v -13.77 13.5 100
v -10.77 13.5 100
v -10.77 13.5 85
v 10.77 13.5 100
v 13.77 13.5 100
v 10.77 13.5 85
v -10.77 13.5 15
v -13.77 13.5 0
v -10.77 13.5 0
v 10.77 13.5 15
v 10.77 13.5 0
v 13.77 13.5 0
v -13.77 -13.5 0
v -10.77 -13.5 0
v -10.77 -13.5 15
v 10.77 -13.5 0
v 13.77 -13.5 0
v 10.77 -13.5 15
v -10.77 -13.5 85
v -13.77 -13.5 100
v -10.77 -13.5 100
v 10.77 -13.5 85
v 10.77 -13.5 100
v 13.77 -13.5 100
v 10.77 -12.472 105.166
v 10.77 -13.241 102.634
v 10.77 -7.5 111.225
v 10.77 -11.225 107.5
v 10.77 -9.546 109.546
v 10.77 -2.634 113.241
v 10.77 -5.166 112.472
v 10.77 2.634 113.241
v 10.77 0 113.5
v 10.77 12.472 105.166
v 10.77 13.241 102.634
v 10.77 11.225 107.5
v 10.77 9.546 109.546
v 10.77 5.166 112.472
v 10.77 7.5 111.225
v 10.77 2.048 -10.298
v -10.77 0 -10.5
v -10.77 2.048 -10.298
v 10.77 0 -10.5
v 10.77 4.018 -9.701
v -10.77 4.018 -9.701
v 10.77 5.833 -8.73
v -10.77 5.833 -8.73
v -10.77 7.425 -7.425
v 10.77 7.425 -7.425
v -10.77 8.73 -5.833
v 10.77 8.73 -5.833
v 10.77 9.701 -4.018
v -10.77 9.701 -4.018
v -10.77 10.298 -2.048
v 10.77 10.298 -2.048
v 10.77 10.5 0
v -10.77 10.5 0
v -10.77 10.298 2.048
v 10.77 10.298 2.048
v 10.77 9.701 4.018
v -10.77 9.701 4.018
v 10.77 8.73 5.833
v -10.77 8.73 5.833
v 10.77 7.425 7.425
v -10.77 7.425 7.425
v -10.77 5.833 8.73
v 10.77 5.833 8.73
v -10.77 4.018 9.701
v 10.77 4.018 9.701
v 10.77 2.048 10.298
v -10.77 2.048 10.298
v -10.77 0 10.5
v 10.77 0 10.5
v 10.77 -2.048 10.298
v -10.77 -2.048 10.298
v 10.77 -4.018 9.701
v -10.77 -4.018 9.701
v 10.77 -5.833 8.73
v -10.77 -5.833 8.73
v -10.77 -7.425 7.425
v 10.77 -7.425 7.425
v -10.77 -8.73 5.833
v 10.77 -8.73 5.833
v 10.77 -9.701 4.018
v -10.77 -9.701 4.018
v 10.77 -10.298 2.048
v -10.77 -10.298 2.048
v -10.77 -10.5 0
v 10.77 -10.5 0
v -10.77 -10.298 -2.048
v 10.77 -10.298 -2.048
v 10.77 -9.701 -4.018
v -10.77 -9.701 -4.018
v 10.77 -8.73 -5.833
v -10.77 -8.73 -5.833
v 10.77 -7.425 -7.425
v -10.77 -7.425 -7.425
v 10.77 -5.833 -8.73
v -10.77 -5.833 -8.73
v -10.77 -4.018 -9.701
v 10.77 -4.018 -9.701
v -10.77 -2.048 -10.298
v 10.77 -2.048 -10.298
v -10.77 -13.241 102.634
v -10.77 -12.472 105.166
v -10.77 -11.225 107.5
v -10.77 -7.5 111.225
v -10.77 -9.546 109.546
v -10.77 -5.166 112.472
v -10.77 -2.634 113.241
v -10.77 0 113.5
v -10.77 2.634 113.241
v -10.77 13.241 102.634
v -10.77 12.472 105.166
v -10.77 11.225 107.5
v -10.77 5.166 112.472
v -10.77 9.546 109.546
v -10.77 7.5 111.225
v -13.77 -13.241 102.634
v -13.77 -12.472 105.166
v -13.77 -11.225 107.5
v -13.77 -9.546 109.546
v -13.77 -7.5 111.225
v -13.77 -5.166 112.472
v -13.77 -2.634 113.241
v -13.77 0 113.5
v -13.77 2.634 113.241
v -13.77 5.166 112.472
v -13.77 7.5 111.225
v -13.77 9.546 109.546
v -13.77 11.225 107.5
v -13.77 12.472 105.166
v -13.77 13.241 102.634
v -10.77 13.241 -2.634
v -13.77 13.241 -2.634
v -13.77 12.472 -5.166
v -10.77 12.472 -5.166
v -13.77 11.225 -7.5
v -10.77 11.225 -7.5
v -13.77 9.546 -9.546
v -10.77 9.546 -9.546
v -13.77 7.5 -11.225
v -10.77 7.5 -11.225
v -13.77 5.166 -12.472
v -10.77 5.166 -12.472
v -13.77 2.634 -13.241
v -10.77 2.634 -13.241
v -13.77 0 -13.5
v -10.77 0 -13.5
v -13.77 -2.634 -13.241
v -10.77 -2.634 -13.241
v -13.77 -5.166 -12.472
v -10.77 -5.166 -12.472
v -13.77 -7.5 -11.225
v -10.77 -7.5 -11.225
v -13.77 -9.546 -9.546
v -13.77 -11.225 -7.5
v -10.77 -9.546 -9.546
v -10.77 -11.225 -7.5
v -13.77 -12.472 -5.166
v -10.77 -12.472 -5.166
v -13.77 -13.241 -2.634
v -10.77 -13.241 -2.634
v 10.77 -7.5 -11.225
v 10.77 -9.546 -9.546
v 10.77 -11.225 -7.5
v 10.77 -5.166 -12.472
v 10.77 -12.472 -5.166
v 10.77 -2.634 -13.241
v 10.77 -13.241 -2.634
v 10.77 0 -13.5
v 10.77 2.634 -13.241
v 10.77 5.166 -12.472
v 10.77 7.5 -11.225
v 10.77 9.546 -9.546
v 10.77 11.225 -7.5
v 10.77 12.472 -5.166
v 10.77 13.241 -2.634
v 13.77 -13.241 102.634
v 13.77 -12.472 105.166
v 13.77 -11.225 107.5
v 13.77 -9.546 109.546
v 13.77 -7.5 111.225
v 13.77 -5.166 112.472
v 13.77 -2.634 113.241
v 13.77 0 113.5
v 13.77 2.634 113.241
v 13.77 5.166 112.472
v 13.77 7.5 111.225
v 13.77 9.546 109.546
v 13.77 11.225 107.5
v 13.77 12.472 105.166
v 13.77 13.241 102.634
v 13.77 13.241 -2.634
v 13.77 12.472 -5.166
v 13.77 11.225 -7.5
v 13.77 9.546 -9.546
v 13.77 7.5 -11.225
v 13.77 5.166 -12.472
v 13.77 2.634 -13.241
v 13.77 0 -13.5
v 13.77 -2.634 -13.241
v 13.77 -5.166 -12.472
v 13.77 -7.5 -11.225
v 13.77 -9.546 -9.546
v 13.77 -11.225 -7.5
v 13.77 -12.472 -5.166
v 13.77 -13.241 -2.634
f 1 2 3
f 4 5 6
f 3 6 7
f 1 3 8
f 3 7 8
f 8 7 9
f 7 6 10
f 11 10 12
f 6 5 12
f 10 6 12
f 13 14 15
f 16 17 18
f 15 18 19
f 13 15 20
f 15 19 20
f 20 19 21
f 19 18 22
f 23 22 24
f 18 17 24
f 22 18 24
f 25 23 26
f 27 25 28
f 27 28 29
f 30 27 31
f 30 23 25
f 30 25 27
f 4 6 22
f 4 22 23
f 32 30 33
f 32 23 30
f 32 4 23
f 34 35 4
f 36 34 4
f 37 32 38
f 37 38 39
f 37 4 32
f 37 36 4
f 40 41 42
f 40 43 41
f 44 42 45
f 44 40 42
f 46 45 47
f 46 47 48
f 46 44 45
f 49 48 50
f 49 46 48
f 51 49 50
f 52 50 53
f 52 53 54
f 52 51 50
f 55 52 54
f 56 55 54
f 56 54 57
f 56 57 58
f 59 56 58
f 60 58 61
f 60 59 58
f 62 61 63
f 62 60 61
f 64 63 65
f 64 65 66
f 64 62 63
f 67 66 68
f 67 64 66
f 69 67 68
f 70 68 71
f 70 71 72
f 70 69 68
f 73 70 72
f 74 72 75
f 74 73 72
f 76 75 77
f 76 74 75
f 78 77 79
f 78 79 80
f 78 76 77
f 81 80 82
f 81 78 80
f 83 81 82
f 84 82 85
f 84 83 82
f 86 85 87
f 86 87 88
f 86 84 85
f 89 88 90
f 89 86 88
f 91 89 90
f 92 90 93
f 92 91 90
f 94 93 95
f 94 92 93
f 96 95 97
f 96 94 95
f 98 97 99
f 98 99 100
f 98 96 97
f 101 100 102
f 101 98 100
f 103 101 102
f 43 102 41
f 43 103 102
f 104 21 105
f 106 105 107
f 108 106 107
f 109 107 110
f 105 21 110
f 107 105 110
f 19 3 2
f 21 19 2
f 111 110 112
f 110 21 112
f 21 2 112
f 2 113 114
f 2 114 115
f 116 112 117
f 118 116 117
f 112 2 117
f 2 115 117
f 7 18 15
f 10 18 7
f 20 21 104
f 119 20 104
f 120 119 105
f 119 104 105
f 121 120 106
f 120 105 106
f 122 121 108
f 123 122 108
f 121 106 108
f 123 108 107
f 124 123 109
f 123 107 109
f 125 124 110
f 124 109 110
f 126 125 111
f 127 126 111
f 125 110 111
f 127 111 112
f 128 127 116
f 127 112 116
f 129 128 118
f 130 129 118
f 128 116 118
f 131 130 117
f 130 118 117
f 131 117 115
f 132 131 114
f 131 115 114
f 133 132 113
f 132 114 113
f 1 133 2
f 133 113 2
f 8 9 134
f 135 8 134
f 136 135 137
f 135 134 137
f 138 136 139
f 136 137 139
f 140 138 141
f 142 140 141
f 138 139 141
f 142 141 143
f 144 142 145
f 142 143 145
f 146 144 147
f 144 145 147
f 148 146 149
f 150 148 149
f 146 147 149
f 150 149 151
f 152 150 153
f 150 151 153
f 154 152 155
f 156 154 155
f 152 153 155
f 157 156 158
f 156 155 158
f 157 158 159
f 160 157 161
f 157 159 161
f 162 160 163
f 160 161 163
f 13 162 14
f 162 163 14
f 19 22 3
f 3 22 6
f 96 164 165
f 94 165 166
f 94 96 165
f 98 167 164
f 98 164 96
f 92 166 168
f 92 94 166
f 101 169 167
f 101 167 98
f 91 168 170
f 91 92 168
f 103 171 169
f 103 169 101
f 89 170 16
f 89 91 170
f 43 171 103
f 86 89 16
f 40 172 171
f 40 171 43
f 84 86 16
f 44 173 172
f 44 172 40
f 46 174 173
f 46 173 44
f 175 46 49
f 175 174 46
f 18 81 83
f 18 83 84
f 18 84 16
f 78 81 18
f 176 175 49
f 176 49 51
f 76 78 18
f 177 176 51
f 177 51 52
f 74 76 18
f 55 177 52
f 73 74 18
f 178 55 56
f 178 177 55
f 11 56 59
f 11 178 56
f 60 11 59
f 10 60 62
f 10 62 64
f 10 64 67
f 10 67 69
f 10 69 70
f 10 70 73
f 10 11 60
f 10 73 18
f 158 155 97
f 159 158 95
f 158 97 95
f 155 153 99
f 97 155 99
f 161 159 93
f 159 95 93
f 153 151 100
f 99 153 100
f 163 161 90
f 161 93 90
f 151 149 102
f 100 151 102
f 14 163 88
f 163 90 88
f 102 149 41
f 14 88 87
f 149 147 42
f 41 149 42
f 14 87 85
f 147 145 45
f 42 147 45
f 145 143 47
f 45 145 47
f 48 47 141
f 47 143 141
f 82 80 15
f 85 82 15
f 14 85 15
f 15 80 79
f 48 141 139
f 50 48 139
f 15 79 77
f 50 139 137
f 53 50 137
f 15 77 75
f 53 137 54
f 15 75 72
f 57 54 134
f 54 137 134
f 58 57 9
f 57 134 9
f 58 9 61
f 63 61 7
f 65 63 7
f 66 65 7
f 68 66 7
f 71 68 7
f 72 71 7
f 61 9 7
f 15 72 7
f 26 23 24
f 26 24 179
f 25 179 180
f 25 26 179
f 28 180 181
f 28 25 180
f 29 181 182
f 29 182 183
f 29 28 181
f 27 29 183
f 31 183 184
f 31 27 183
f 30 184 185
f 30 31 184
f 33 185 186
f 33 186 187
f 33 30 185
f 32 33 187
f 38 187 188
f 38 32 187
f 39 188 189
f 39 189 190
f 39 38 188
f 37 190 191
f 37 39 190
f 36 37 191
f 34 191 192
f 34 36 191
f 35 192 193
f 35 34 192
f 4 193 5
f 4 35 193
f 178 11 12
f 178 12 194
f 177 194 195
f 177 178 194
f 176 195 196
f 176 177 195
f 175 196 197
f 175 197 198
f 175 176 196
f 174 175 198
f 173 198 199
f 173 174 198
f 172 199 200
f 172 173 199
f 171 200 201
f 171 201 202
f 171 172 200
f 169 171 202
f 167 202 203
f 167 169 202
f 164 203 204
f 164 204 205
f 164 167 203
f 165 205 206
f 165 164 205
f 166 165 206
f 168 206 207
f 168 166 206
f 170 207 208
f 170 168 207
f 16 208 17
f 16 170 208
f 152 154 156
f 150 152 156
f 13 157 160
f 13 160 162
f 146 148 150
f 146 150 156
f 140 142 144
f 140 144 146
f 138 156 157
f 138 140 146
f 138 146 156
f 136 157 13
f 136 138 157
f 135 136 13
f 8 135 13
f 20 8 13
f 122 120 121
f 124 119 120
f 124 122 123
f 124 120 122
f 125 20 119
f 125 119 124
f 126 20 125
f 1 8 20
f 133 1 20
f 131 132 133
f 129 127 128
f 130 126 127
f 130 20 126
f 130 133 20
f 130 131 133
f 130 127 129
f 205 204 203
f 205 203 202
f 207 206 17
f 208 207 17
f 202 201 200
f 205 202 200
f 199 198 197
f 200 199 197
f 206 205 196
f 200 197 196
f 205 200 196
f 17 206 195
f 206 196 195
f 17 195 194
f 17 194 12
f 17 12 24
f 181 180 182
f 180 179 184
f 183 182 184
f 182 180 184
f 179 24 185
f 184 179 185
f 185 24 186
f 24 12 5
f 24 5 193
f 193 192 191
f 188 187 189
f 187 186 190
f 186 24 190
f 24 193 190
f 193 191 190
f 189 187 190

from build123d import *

# Parameters (mm, degrees)
SCHIZZO1_R                   = 10.5
ESTRUSIONE_ESTRUSIONE1_DEPTH = 10.77
ESTRUSIONE_ESTRUSIONE2_START = 10.77
ESTRUSIONE_ESTRUSIONE2_DEPTH = 3
ESTRUSIONE_ESTRUSIONE3_START = -3
SCHIZZO4_W                   = 70
SCHIZZO4_H                   = 27
ESTRUSIONE_ESTRUSIONE3_DEPTH = 21.54


with BuildPart() as part:
    # Schizzo1 → Estrusione-Estrusione1 (new, symmetric)
    with BuildSketch(Plane(origin=(0, 0, 0), x_dir=(0, 0, -1), z_dir=(1, 0, 0))):
        Circle(SCHIZZO1_R)
    extrude(amount=ESTRUSIONE_ESTRUSIONE1_DEPTH, both=True)

    # Schizzo3 → Estrusione-Estrusione2 (add)
    with BuildSketch(Plane(origin=(0, 0, 0), x_dir=(0, 0, -1), z_dir=(1, 0, 0)).offset(ESTRUSIONE_ESTRUSIONE2_START)):
        with BuildLine():
            Line((-100, 13.5), (0, 13.5))
            ThreePointArc((0, 13.5), (13.5, 0), (0, -13.5))
            Line((0, -13.5), (-100, -13.5))
            ThreePointArc((-100, -13.5), (-113.5, 0), (-100, 13.5))
        make_face()
    estrusione_estrusione2 = extrude(amount=ESTRUSIONE_ESTRUSIONE2_DEPTH)

    # Specchia4: Estrusione-Estrusione2 across plane
    add(estrusione_estrusione2.mirror(Plane(origin=(0, 0, 0), x_dir=(0, 0, 1), z_dir=(1, 0, 0))))

    # Schizzo4 → Estrusione-Estrusione3 (add)
    with BuildSketch(Plane(origin=(13.77, 0, 0), x_dir=(0, 0, -1), z_dir=(1, 0, 0)).offset(ESTRUSIONE_ESTRUSIONE3_START)):
        with Locations((-50, 0)):
            Rectangle(SCHIZZO4_W, SCHIZZO4_H)
    extrude(amount=-ESTRUSIONE_ESTRUSIONE3_DEPTH)


solid = part.part
